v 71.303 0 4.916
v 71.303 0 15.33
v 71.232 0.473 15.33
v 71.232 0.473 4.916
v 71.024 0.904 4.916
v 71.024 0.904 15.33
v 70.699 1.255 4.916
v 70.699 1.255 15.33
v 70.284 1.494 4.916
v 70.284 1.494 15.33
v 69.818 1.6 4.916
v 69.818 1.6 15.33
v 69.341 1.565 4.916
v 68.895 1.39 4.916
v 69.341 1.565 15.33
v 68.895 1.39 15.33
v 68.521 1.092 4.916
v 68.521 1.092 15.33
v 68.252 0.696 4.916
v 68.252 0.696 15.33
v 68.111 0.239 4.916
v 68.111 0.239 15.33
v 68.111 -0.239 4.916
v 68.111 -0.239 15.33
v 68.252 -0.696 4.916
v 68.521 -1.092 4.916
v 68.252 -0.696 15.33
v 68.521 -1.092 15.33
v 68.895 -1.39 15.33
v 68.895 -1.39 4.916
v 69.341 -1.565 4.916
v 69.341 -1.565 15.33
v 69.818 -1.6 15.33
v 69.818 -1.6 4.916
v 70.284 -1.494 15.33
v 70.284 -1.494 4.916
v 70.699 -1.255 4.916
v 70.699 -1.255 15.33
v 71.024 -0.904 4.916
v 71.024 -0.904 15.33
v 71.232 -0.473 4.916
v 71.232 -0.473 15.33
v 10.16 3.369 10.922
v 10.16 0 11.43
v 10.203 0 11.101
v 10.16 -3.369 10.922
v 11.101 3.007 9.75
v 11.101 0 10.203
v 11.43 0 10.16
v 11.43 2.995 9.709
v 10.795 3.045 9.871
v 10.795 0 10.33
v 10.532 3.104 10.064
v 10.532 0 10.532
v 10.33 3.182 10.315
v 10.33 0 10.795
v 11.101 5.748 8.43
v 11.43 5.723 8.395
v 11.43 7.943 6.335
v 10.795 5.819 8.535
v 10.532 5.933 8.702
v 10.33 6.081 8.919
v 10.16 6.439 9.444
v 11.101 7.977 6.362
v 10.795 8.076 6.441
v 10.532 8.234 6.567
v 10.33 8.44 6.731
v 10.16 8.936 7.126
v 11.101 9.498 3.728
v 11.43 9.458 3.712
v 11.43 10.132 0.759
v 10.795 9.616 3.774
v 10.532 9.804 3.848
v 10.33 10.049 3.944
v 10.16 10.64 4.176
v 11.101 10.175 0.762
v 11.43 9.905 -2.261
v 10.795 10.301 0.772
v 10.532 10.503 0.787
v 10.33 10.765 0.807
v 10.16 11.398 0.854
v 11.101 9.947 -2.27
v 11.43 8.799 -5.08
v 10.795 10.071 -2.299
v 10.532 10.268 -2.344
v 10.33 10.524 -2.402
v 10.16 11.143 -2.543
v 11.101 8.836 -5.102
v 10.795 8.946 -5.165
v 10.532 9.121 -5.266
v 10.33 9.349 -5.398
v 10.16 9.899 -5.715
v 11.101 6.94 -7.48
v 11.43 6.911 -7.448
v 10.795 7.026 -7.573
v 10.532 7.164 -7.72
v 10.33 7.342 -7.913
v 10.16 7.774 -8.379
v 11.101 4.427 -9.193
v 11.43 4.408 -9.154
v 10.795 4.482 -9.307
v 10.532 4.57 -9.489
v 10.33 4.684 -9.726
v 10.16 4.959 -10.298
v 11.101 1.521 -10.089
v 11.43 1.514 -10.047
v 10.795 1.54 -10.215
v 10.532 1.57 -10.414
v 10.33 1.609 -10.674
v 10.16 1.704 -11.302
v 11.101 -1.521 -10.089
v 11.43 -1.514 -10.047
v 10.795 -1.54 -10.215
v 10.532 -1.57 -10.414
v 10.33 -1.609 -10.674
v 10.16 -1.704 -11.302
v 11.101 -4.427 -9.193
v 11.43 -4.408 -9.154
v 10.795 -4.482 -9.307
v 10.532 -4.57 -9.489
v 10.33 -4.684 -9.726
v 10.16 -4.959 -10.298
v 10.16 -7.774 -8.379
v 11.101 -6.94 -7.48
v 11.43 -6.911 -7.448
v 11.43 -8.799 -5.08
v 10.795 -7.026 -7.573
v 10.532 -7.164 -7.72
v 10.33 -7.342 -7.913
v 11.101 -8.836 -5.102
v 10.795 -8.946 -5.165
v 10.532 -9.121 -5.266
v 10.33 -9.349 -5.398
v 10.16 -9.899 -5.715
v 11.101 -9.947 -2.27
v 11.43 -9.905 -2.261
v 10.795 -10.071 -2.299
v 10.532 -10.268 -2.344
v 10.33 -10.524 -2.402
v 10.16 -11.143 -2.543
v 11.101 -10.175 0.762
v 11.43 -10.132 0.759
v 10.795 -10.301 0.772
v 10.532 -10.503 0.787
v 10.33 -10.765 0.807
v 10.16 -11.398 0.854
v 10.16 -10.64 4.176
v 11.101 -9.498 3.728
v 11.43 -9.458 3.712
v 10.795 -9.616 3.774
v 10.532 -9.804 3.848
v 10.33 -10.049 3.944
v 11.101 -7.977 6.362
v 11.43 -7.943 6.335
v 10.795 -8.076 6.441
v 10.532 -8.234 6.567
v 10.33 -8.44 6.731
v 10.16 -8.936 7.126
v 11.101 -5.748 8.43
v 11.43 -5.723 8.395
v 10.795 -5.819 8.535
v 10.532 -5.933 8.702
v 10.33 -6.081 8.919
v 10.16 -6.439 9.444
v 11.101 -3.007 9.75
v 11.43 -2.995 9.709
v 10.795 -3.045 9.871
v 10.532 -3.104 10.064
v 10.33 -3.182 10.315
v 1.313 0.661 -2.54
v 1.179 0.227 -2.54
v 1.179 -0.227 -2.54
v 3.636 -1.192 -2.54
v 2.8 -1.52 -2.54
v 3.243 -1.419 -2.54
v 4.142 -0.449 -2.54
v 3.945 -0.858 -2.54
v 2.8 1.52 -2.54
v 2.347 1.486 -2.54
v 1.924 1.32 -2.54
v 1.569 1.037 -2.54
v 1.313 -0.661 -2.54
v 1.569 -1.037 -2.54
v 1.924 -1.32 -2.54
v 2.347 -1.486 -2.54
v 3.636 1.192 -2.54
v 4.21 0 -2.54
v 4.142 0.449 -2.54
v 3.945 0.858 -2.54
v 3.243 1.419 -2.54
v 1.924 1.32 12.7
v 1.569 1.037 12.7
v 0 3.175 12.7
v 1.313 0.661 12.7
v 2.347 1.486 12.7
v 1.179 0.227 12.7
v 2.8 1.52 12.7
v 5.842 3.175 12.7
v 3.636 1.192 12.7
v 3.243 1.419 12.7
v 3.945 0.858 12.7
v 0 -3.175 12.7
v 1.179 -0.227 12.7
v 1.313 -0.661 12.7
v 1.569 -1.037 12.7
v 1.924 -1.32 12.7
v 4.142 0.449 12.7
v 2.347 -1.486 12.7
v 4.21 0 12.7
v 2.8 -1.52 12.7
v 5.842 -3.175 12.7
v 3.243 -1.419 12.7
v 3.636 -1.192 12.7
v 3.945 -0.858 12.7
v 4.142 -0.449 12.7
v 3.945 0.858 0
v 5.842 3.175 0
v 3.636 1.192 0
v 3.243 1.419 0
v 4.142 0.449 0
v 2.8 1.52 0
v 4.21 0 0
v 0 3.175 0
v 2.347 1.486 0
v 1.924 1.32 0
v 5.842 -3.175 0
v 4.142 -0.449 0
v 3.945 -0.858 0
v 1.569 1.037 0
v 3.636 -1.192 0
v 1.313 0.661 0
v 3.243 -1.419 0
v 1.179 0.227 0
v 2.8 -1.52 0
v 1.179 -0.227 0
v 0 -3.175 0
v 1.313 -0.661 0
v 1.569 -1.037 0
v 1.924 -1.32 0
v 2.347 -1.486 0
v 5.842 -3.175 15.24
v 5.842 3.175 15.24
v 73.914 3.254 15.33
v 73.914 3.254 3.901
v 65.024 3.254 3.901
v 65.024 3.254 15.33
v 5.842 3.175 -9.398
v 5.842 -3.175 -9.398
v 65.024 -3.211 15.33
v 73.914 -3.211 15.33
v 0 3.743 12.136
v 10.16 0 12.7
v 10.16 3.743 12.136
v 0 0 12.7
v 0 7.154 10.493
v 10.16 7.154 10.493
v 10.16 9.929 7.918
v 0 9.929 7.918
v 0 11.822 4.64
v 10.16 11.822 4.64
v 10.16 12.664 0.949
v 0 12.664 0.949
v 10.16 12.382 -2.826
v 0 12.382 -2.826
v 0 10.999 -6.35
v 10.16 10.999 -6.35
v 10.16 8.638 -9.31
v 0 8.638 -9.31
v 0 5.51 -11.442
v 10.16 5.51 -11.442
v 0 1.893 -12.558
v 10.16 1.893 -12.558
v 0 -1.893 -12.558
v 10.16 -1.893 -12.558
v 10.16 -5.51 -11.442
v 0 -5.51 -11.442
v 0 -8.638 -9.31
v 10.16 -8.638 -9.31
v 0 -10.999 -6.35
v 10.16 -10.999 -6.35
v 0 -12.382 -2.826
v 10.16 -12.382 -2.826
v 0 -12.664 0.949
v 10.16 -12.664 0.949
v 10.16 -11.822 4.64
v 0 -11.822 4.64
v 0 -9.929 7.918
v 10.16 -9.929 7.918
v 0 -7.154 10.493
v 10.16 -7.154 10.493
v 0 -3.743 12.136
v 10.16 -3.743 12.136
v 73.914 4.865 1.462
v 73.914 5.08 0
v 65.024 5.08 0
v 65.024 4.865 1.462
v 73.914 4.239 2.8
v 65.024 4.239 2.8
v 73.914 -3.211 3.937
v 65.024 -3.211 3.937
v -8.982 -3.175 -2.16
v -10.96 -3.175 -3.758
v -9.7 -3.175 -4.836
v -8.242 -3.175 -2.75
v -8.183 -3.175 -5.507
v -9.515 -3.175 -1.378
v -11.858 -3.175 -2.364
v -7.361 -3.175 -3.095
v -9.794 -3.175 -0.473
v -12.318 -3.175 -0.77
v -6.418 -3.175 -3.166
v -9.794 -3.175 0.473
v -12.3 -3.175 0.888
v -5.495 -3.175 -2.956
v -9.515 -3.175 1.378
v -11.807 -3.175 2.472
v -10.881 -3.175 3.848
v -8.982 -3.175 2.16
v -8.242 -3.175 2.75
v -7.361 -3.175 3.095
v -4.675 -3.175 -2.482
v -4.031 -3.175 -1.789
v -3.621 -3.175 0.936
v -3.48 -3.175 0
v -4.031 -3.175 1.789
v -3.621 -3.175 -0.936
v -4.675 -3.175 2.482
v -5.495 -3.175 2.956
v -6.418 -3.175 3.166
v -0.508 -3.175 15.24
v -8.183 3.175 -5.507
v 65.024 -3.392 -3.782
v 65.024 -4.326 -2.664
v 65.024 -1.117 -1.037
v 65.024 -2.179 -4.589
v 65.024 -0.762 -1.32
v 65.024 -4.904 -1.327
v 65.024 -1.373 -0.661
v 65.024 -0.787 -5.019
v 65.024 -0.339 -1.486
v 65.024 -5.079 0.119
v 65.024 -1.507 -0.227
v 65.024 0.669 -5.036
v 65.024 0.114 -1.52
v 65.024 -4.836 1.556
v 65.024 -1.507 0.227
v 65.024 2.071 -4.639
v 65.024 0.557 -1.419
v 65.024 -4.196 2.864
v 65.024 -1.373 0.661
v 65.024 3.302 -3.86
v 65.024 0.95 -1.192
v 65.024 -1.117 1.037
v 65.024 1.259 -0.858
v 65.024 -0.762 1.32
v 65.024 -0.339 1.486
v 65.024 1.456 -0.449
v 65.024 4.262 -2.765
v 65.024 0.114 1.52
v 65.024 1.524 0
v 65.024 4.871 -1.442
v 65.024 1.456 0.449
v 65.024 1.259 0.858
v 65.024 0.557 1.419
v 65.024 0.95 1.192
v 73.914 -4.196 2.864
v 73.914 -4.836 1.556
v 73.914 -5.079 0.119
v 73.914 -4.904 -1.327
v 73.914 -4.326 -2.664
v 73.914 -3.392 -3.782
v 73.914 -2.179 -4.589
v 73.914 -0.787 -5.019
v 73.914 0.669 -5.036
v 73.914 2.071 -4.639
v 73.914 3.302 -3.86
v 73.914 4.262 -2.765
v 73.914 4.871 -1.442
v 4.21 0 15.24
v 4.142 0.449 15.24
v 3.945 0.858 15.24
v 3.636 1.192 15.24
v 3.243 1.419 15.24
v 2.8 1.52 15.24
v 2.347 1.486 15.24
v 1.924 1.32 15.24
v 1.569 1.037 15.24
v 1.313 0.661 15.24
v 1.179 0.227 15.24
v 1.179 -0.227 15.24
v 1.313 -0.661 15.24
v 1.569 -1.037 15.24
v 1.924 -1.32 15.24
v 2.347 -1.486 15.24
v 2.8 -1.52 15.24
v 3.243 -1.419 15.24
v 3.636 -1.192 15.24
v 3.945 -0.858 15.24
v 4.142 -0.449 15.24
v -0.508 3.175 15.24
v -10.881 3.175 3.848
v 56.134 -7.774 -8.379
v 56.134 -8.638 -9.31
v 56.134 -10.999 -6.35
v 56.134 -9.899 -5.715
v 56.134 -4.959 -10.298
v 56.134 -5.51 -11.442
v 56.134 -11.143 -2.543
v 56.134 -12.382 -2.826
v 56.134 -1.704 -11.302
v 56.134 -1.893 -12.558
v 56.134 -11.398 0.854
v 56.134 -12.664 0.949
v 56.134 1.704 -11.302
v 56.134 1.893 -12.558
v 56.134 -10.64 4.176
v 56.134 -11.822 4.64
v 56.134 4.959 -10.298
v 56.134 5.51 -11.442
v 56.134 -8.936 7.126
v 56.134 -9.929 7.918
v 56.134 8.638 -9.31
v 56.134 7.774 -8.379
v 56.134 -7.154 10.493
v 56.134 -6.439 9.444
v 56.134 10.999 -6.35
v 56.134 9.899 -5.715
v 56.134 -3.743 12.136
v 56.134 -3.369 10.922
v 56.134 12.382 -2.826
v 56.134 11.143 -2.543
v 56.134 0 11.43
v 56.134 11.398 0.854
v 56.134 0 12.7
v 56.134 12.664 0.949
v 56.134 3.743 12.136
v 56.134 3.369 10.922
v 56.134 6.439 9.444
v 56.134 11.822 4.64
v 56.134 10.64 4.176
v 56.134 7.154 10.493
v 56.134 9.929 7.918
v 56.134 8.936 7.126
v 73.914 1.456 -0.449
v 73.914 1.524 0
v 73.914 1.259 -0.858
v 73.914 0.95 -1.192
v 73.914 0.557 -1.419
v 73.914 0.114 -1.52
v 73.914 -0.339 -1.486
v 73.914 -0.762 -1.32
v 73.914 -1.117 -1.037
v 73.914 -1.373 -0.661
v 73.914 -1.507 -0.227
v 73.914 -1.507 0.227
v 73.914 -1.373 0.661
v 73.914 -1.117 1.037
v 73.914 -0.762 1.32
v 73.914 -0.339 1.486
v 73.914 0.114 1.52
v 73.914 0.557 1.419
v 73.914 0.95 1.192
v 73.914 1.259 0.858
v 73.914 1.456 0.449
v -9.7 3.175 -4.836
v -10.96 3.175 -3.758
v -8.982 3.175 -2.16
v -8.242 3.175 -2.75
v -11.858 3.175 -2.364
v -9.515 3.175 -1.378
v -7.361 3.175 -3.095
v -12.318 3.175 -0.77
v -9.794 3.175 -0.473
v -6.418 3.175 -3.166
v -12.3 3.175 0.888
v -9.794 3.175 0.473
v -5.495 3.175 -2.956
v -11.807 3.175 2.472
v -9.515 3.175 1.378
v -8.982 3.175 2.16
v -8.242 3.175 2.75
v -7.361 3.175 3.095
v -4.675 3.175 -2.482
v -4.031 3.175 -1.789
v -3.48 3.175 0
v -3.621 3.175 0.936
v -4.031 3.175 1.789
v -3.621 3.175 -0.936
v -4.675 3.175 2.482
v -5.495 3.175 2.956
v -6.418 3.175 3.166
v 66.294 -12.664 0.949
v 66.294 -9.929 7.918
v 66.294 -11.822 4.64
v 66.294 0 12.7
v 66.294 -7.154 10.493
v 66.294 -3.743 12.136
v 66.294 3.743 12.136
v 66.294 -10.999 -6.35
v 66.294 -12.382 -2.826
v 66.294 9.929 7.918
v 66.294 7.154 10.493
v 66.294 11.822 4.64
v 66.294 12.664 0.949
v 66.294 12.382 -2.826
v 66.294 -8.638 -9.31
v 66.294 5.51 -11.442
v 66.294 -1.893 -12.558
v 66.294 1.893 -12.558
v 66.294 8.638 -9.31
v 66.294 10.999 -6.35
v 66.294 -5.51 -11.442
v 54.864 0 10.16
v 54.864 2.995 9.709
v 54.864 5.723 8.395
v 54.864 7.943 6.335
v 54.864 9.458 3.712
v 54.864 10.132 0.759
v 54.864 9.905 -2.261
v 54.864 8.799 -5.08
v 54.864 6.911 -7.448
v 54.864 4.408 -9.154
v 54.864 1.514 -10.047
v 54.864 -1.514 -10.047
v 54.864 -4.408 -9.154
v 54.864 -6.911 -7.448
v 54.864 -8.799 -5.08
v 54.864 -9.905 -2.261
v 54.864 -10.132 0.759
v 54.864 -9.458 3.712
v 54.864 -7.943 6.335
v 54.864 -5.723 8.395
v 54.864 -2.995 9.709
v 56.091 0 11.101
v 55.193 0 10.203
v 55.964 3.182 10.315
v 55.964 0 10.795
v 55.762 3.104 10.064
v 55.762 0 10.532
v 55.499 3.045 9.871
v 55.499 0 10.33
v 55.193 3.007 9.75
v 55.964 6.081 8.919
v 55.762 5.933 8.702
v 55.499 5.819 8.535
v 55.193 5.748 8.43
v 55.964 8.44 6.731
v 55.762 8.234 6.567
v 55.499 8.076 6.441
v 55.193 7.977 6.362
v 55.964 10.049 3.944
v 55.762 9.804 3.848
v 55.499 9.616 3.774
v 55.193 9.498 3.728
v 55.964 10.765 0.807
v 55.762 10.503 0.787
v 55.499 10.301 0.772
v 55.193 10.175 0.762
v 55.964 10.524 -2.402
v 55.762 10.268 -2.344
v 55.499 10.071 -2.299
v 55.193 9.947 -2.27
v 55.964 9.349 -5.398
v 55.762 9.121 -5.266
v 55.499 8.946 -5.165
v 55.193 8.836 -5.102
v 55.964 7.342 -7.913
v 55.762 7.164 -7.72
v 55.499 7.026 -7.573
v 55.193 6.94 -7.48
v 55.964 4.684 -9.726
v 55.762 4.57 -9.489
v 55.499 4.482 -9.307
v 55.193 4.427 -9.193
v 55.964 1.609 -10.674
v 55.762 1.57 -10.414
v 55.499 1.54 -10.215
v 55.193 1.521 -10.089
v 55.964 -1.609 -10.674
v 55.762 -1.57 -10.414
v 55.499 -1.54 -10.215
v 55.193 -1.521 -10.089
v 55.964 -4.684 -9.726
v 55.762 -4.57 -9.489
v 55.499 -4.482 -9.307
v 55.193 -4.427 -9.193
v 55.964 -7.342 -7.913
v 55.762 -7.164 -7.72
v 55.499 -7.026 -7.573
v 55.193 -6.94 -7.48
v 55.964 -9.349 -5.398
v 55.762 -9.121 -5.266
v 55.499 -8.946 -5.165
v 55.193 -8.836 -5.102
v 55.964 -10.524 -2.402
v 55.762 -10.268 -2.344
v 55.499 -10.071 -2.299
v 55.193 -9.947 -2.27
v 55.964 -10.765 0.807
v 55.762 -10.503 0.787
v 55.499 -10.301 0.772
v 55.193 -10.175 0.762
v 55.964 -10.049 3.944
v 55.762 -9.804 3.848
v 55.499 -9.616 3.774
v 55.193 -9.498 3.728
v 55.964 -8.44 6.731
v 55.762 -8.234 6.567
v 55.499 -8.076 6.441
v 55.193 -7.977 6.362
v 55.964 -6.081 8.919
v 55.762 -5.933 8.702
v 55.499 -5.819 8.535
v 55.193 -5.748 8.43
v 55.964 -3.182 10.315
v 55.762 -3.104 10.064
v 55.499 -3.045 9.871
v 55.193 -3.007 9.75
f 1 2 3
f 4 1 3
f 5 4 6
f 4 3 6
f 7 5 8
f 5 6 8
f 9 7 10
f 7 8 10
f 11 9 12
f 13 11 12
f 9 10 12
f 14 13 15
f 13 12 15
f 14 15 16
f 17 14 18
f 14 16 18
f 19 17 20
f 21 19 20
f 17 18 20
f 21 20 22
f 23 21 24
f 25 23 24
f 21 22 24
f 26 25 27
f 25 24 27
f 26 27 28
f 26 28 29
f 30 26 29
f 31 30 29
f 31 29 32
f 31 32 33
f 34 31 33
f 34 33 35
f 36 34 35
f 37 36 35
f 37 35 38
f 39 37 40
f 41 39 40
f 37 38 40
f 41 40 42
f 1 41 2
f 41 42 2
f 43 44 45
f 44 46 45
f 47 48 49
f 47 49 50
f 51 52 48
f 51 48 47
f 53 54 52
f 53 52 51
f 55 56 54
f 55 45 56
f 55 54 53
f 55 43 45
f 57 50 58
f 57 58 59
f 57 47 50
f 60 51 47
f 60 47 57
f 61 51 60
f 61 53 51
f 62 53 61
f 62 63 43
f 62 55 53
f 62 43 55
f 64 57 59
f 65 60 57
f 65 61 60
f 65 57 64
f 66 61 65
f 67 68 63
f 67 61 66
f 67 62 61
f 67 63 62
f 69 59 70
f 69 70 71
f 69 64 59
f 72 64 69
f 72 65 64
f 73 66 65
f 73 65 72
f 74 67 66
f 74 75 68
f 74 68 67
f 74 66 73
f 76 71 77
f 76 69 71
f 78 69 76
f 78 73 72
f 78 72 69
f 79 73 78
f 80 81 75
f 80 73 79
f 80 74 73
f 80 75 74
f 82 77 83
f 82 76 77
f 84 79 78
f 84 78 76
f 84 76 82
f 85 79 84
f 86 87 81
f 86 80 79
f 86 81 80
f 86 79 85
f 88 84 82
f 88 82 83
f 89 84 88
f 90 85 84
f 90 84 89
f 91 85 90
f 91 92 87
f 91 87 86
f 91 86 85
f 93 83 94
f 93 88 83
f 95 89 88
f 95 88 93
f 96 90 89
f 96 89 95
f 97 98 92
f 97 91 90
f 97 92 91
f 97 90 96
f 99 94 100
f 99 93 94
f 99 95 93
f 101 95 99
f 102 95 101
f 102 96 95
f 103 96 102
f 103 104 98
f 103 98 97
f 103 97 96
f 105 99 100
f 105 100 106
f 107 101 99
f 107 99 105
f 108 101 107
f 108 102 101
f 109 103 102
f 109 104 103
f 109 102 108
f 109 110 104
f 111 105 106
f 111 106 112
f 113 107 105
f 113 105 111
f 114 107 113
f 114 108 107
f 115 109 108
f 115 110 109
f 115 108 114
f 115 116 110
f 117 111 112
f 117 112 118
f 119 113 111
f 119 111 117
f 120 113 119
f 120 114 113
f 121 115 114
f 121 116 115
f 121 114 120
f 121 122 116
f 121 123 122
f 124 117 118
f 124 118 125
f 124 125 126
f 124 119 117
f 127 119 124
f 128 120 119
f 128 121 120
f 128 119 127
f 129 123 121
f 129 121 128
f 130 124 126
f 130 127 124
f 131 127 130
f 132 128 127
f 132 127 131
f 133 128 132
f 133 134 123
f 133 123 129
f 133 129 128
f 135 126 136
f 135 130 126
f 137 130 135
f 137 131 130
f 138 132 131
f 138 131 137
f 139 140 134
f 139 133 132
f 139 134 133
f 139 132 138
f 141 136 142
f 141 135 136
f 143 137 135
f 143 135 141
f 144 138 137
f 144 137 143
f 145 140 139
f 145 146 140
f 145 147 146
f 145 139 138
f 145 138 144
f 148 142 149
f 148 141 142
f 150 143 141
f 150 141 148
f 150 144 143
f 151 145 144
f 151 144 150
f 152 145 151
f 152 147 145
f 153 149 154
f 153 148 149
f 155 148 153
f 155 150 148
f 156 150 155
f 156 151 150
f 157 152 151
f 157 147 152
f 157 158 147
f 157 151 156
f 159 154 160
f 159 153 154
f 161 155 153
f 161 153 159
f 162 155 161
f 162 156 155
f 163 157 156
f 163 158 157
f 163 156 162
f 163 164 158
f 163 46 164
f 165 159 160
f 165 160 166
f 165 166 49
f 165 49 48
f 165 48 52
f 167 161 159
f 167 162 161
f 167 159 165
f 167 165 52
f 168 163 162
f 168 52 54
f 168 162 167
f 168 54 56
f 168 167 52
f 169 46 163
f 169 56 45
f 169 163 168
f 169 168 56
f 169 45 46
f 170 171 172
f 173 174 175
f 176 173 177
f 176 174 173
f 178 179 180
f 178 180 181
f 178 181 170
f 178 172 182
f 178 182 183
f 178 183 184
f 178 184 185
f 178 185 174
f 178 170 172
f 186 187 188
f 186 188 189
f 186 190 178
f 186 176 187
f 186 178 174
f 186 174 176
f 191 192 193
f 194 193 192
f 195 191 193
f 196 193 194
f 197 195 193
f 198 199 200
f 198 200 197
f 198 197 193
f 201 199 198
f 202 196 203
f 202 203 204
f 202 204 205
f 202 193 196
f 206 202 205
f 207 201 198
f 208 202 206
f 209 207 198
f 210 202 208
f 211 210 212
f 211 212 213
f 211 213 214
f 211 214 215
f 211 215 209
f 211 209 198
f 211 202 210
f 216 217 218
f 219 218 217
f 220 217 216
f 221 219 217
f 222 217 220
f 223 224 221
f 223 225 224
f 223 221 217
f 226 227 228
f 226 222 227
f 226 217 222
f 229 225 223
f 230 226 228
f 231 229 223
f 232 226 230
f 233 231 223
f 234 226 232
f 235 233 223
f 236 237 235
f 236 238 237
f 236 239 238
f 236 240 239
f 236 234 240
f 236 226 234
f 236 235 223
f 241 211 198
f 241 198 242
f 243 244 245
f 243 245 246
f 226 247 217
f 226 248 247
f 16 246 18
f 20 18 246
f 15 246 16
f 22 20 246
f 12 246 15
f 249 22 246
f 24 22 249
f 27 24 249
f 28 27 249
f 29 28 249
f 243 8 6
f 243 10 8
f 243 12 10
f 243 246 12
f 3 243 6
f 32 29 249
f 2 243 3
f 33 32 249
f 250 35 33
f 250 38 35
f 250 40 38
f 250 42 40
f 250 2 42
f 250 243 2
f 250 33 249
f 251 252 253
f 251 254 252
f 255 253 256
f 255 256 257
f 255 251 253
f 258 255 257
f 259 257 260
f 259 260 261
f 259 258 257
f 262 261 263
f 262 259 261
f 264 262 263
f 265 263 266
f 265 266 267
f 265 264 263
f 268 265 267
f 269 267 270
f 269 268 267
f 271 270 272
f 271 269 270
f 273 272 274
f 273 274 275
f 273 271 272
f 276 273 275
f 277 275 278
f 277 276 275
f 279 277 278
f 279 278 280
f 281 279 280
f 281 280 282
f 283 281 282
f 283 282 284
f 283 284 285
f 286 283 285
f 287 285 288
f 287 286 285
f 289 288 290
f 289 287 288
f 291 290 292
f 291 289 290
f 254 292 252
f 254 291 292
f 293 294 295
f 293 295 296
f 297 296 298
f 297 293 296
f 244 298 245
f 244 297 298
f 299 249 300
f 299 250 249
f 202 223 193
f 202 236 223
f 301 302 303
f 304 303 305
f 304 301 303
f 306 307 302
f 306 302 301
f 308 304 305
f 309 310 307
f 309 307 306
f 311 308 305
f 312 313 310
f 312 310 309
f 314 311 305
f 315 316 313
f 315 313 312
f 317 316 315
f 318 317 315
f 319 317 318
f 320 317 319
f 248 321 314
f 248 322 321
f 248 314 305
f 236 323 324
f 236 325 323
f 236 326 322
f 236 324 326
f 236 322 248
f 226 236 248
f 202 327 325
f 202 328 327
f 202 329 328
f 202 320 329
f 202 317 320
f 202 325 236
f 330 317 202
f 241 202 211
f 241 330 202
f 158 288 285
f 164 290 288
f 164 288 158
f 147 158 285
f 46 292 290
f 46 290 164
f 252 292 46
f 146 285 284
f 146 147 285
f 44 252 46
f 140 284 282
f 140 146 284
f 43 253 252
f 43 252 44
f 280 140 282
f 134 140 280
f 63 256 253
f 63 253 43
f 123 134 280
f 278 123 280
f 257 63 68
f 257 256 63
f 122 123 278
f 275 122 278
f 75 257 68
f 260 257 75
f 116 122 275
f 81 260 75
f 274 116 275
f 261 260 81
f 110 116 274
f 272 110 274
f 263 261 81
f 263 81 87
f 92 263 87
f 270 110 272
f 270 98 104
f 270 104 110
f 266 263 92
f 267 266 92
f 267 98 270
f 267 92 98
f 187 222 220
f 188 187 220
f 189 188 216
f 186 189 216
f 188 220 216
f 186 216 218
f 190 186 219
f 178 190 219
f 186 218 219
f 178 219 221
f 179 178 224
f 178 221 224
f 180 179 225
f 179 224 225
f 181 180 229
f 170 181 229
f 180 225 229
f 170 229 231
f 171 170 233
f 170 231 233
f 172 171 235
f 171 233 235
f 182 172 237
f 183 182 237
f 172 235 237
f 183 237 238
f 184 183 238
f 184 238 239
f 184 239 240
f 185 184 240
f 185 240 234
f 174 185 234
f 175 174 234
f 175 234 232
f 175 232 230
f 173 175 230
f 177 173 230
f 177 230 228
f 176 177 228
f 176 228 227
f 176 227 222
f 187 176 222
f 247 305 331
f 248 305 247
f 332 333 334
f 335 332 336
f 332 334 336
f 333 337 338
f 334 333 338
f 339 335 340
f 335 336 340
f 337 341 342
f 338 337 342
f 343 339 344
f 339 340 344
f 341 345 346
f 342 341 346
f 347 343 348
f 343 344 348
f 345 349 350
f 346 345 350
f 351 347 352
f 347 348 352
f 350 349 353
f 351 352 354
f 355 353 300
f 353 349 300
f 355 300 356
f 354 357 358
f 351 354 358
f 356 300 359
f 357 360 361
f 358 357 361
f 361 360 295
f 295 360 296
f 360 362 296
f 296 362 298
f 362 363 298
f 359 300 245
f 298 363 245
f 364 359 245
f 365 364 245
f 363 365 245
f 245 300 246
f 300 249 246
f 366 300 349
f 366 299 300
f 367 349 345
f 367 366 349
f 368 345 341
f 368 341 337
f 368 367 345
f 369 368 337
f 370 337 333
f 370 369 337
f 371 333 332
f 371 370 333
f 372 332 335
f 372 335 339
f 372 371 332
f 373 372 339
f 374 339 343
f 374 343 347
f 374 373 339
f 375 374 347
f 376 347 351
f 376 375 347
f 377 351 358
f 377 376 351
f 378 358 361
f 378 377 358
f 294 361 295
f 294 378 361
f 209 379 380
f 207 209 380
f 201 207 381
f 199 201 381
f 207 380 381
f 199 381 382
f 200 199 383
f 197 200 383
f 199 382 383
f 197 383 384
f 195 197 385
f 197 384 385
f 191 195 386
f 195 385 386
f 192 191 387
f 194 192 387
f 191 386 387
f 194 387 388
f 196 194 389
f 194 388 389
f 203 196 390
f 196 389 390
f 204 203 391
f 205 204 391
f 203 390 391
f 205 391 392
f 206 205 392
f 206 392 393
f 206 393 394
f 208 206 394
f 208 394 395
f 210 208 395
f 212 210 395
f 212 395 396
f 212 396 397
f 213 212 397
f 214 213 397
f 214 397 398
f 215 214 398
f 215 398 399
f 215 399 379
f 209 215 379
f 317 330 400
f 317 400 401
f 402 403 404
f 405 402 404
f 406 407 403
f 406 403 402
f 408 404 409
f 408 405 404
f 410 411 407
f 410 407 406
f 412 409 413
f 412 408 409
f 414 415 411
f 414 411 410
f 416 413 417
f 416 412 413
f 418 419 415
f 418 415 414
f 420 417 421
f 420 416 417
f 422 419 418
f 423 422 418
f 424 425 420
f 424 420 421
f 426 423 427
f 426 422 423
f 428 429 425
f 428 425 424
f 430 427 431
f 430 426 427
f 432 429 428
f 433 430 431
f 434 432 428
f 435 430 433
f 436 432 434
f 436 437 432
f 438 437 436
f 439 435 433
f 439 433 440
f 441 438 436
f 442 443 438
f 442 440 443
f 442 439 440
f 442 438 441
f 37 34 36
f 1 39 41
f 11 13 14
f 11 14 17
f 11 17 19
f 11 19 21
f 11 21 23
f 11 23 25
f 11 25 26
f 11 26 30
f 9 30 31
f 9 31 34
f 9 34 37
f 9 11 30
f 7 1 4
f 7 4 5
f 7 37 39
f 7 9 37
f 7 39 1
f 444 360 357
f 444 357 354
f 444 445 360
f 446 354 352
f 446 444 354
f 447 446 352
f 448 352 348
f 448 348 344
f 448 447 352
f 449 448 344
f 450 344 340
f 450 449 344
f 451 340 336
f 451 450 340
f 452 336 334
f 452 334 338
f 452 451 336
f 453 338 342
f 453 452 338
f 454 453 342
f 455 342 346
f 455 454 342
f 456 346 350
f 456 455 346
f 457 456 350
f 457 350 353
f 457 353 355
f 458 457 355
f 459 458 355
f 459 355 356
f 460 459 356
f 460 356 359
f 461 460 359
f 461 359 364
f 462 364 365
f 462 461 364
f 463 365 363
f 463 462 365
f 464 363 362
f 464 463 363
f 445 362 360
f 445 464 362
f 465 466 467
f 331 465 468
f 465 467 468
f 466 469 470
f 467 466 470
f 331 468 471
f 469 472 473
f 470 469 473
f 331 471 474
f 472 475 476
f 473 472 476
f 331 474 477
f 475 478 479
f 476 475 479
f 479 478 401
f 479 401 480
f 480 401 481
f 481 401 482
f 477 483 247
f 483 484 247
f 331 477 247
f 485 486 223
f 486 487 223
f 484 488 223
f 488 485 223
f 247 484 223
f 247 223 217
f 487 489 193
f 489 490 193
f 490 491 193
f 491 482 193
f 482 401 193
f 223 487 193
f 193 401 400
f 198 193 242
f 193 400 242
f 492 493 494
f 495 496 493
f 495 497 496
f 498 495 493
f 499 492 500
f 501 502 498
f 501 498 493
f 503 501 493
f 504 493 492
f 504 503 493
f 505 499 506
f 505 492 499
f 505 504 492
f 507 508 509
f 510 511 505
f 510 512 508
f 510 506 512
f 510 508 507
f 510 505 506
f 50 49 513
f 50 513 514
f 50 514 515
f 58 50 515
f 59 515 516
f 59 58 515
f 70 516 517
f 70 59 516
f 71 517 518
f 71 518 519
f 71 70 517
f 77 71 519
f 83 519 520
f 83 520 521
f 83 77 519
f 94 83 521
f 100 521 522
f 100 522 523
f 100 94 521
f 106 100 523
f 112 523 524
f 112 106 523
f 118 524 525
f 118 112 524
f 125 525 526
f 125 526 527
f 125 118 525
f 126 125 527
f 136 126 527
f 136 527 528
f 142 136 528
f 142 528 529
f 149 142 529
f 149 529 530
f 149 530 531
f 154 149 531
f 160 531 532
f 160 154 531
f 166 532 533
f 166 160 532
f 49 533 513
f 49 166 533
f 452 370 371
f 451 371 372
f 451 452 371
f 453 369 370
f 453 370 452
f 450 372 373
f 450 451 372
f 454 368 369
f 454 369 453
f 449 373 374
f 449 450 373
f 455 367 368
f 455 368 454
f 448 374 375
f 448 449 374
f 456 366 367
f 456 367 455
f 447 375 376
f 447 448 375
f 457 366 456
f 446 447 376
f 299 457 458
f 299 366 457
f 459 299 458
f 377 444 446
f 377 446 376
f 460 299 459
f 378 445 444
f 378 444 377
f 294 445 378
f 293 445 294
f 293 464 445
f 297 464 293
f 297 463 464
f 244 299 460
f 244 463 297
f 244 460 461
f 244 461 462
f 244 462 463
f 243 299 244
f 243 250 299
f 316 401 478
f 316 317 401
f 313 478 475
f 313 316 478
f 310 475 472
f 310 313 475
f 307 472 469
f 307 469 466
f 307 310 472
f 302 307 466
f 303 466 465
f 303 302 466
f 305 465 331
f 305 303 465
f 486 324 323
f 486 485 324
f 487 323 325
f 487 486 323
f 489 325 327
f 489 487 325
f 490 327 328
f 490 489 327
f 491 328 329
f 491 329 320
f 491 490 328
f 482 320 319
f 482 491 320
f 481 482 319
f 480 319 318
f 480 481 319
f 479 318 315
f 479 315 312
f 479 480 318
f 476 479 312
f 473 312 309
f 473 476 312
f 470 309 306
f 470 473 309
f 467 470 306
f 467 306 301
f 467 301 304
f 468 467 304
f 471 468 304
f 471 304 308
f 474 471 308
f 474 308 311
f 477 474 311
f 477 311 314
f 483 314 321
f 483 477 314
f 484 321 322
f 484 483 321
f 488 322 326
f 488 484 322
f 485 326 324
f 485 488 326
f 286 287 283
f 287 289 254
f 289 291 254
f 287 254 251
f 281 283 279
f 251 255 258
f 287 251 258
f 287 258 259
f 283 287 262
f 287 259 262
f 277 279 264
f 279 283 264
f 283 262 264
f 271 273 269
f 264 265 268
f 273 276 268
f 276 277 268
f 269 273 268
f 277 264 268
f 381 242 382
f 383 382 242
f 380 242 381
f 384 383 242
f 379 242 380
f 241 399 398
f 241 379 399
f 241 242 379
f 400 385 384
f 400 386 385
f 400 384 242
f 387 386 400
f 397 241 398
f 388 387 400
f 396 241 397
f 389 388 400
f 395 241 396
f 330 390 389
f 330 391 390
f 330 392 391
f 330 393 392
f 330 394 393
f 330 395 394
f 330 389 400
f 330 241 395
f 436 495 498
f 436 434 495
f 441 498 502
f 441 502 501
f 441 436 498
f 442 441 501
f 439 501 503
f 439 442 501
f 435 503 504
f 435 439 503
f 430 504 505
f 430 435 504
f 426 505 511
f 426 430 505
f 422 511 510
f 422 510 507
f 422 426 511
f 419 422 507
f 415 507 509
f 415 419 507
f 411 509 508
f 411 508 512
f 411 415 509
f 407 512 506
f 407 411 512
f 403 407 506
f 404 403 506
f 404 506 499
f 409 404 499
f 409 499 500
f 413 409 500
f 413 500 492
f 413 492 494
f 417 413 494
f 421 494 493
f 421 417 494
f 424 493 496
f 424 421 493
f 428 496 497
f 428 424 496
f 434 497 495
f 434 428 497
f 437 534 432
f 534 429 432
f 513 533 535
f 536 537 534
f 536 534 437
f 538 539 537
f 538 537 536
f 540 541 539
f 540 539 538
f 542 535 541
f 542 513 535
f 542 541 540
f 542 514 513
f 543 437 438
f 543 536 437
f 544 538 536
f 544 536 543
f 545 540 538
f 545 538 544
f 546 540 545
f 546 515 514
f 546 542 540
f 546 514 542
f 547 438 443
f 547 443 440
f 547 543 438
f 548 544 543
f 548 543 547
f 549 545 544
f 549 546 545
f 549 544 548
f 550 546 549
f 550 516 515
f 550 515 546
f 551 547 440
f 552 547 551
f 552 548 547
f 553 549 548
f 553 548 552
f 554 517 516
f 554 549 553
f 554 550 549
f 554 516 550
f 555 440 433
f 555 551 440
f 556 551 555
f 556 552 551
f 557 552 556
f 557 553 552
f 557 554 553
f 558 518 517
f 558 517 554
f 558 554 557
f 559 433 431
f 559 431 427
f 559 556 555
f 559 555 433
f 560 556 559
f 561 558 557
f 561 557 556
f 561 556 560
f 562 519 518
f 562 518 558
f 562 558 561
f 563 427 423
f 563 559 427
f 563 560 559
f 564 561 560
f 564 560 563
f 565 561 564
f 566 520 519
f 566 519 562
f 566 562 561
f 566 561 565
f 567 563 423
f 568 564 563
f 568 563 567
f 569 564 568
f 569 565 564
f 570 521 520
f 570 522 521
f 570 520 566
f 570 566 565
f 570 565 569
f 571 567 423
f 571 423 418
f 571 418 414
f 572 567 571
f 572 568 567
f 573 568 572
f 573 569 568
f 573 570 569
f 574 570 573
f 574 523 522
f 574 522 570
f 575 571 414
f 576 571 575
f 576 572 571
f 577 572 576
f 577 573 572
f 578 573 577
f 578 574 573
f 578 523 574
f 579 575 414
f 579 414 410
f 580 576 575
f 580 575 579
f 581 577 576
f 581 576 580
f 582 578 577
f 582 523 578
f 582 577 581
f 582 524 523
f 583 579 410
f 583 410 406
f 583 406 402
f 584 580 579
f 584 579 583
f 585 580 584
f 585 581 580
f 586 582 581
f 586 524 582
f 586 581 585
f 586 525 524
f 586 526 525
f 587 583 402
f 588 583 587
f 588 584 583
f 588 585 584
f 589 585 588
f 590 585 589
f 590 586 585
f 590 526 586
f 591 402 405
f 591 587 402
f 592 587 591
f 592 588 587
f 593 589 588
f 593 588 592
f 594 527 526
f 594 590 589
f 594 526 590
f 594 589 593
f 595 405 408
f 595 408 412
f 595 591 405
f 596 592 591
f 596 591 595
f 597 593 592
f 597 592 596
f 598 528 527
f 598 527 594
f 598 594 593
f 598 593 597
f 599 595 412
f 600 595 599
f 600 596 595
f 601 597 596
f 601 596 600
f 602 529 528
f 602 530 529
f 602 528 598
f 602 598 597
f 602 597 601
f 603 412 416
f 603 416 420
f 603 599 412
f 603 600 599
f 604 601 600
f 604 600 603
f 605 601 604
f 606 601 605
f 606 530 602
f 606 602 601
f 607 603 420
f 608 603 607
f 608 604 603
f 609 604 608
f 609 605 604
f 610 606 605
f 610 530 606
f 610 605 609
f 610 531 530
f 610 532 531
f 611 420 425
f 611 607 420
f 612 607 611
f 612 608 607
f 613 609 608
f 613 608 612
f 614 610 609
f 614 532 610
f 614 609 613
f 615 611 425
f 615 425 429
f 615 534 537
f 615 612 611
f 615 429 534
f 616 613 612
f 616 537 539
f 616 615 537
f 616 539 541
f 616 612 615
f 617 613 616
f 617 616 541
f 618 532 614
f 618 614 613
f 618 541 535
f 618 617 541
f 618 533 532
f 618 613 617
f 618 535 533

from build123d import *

# Parameters (mm, degrees)
F0_W          = 5.842
F0_H          = 12.7
F0_R          = 3.175
F2_DEPTH      = 3.175
F4_DEPTH      = 7.62
F4_DEPTH_BACK = 1.27
F5_R          = 1.524
F6_DEPTH      = 17.78
F7_R          = 1.60493029
F8_DEPTH      = 10.414
F9_R          = 1.27


with BuildPart() as f1:
    # F0 (on Front) → F1 (revolve)
    with BuildSketch(Plane.XZ):
        Polygon((5.842, 12.7), (5.842, 0), (66.294, 0), (66.294, 12.7), (56.134, 12.7), (56.134, 10.16), (10.16, 10.16), (10.16, 12.7), align=None)
        with Locations((2.921, 6.35)):
            Rectangle(F0_W, F0_H)
    revolve(axis=Axis((33.147, 0, 0), (-1, 0, 0)))

    # F9
    f9_edges = [f1.edges().sort_by_distance(p)[0] for p in [
        (56.134, 0, -10.16),
        (10.16, 0, -10.16),
        (33.147, 0, 10.16),
    ]]
    fillet(f9_edges, radius=F9_R)


with BuildPart() as f2:
    # F0 (on Front) → F2 (new body, symmetric)
    with BuildSketch(Plane.XZ):
        with BuildLine():
            Line((-0.9398, 0), (0, 0))
            Line((0, 0), (0, 12.7))
            Line((0, 12.7), (5.842, 12.7))
            Line((5.842, 12.7), (5.842, 15.24))
            Line((5.842, 15.24), (-0.508, 15.24))
            Line((-0.508, 15.24), (-10.8806298187, 3.8475430269))
            ThreePointArc((-10.8806298187, 3.8475430269), (-4.5919612295, 5.3297205562), (-0.9398, 0))
        make_face()
        with BuildLine():
            Line((5.842, 0), (0, 0))
            Line((0, 0), (-0.9398, 0))
            ThreePointArc((-0.9398, 0), (-3.1957909266, -4.5493385486), (-8.1826630726, -5.5069827884))
            Line((-8.1826630726, -5.5069827884), (5.842, -9.398))
            Line((5.842, -9.398), (5.842, 0))
        make_face()
        with BuildLine():
            ThreePointArc((-8.1826630726, -5.5069827884), (-3.1957909266, -4.5493385486), (-0.9398, 0))
            ThreePointArc((-0.9398, 0), (-4.5919612295, 5.3297205562), (-10.8806298187, 3.8475430269))
            ThreePointArc((-10.8806298187, 3.8475430269), (-12.1459778134, -1.5837270034), (-8.1826630726, -5.5069827884))
        make_face()
        with Locations((-6.6548, 0)):
            Circle(F0_R, mode=Mode.SUBTRACT)
    extrude(amount=F2_DEPTH, both=True)

    # F5 (on face) → F6 (cut)
    with BuildSketch(Plane.XY.offset(15.24)):
        with Locations((2.6858148674, 0)):
            Circle(F5_R)
    extrude(amount=-F6_DEPTH, mode=Mode.SUBTRACT)


with BuildPart() as f4:
    # F3 (on face) → F4 (new body, two sides)
    with BuildSketch(Plane.YZ.offset(66.294)) as f4_sk:
        with BuildLine():
            ThreePointArc((-3.2105364371, 3.936858619), (0.0281273028, 5.0799221308), (3.2539346721, 3.9010651302))
            Line((3.2539346721, 3.9010651302), (3.2539346721, 12.2760705908))
            ThreePointArc((3.2539346721, 12.2760705908), (0.0224379801, 12.6999801786), (-3.2105364371, 12.2874918428))
            Line((-3.2105364371, 12.2874918428), (-3.2105364371, 3.936858619))
        make_face()
        with BuildLine():
            ThreePointArc((-1.524, 0), (0, 1.524), (1.524, 0))
            Line((1.524, 0), (3.2539346721, 0))
            Line((3.2539346721, 0), (3.2539346721, 3.9010651302))
            ThreePointArc((3.2539346721, 3.9010651302), (0.0281273028, 5.0799221308), (-3.2105364371, 3.936858619))
            Line((-3.2105364371, 3.936858619), (-3.2105364371, 0))
            Line((-3.2105364371, 0), (-1.524, 0))
        make_face()
        with BuildLine():
            Line((3.2539346721, 0), (1.524, 0))
            ThreePointArc((1.524, 0), (0, -1.524), (-1.524, 0))
            Line((-1.524, 0), (-3.2105364371, 0))
            Line((-3.2105364371, 0), (-3.2105364371, 3.936858619))
            ThreePointArc((-3.2105364371, 3.936858619), (-2.1790909687, -4.5888955698), (5.08, 0))
            ThreePointArc((5.08, 0), (4.6008905733, 2.1536494452), (3.2539346721, 3.9010651302))
            Line((3.2539346721, 3.9010651302), (3.2539346721, 0))
        make_face()
        with BuildLine():
            ThreePointArc((-3.2105364371, 12.2874918428), (0.0224379801, 12.6999801786), (3.2539346721, 12.2760705908))
            Line((3.2539346721, 12.2760705908), (3.2539346721, 15.3298256919))
            Line((3.2539346721, 15.3298256919), (-3.2105364371, 15.3298256919))
            Line((-3.2105364371, 15.3298256919), (-3.2105364371, 12.2874918428))
        make_face()
    extrude(amount=F4_DEPTH)
    extrude(f4_sk.sketch, amount=-F4_DEPTH_BACK)

    # F7 (on face) → F8 (cut)
    with BuildSketch(Plane.XY.offset(15.3298256919)):
        with Locations((69.6979388595, 0)):
            Circle(F7_R)
    extrude(amount=-F8_DEPTH, mode=Mode.SUBTRACT)


solid = Compound([f1.part, f2.part, f4.part])
